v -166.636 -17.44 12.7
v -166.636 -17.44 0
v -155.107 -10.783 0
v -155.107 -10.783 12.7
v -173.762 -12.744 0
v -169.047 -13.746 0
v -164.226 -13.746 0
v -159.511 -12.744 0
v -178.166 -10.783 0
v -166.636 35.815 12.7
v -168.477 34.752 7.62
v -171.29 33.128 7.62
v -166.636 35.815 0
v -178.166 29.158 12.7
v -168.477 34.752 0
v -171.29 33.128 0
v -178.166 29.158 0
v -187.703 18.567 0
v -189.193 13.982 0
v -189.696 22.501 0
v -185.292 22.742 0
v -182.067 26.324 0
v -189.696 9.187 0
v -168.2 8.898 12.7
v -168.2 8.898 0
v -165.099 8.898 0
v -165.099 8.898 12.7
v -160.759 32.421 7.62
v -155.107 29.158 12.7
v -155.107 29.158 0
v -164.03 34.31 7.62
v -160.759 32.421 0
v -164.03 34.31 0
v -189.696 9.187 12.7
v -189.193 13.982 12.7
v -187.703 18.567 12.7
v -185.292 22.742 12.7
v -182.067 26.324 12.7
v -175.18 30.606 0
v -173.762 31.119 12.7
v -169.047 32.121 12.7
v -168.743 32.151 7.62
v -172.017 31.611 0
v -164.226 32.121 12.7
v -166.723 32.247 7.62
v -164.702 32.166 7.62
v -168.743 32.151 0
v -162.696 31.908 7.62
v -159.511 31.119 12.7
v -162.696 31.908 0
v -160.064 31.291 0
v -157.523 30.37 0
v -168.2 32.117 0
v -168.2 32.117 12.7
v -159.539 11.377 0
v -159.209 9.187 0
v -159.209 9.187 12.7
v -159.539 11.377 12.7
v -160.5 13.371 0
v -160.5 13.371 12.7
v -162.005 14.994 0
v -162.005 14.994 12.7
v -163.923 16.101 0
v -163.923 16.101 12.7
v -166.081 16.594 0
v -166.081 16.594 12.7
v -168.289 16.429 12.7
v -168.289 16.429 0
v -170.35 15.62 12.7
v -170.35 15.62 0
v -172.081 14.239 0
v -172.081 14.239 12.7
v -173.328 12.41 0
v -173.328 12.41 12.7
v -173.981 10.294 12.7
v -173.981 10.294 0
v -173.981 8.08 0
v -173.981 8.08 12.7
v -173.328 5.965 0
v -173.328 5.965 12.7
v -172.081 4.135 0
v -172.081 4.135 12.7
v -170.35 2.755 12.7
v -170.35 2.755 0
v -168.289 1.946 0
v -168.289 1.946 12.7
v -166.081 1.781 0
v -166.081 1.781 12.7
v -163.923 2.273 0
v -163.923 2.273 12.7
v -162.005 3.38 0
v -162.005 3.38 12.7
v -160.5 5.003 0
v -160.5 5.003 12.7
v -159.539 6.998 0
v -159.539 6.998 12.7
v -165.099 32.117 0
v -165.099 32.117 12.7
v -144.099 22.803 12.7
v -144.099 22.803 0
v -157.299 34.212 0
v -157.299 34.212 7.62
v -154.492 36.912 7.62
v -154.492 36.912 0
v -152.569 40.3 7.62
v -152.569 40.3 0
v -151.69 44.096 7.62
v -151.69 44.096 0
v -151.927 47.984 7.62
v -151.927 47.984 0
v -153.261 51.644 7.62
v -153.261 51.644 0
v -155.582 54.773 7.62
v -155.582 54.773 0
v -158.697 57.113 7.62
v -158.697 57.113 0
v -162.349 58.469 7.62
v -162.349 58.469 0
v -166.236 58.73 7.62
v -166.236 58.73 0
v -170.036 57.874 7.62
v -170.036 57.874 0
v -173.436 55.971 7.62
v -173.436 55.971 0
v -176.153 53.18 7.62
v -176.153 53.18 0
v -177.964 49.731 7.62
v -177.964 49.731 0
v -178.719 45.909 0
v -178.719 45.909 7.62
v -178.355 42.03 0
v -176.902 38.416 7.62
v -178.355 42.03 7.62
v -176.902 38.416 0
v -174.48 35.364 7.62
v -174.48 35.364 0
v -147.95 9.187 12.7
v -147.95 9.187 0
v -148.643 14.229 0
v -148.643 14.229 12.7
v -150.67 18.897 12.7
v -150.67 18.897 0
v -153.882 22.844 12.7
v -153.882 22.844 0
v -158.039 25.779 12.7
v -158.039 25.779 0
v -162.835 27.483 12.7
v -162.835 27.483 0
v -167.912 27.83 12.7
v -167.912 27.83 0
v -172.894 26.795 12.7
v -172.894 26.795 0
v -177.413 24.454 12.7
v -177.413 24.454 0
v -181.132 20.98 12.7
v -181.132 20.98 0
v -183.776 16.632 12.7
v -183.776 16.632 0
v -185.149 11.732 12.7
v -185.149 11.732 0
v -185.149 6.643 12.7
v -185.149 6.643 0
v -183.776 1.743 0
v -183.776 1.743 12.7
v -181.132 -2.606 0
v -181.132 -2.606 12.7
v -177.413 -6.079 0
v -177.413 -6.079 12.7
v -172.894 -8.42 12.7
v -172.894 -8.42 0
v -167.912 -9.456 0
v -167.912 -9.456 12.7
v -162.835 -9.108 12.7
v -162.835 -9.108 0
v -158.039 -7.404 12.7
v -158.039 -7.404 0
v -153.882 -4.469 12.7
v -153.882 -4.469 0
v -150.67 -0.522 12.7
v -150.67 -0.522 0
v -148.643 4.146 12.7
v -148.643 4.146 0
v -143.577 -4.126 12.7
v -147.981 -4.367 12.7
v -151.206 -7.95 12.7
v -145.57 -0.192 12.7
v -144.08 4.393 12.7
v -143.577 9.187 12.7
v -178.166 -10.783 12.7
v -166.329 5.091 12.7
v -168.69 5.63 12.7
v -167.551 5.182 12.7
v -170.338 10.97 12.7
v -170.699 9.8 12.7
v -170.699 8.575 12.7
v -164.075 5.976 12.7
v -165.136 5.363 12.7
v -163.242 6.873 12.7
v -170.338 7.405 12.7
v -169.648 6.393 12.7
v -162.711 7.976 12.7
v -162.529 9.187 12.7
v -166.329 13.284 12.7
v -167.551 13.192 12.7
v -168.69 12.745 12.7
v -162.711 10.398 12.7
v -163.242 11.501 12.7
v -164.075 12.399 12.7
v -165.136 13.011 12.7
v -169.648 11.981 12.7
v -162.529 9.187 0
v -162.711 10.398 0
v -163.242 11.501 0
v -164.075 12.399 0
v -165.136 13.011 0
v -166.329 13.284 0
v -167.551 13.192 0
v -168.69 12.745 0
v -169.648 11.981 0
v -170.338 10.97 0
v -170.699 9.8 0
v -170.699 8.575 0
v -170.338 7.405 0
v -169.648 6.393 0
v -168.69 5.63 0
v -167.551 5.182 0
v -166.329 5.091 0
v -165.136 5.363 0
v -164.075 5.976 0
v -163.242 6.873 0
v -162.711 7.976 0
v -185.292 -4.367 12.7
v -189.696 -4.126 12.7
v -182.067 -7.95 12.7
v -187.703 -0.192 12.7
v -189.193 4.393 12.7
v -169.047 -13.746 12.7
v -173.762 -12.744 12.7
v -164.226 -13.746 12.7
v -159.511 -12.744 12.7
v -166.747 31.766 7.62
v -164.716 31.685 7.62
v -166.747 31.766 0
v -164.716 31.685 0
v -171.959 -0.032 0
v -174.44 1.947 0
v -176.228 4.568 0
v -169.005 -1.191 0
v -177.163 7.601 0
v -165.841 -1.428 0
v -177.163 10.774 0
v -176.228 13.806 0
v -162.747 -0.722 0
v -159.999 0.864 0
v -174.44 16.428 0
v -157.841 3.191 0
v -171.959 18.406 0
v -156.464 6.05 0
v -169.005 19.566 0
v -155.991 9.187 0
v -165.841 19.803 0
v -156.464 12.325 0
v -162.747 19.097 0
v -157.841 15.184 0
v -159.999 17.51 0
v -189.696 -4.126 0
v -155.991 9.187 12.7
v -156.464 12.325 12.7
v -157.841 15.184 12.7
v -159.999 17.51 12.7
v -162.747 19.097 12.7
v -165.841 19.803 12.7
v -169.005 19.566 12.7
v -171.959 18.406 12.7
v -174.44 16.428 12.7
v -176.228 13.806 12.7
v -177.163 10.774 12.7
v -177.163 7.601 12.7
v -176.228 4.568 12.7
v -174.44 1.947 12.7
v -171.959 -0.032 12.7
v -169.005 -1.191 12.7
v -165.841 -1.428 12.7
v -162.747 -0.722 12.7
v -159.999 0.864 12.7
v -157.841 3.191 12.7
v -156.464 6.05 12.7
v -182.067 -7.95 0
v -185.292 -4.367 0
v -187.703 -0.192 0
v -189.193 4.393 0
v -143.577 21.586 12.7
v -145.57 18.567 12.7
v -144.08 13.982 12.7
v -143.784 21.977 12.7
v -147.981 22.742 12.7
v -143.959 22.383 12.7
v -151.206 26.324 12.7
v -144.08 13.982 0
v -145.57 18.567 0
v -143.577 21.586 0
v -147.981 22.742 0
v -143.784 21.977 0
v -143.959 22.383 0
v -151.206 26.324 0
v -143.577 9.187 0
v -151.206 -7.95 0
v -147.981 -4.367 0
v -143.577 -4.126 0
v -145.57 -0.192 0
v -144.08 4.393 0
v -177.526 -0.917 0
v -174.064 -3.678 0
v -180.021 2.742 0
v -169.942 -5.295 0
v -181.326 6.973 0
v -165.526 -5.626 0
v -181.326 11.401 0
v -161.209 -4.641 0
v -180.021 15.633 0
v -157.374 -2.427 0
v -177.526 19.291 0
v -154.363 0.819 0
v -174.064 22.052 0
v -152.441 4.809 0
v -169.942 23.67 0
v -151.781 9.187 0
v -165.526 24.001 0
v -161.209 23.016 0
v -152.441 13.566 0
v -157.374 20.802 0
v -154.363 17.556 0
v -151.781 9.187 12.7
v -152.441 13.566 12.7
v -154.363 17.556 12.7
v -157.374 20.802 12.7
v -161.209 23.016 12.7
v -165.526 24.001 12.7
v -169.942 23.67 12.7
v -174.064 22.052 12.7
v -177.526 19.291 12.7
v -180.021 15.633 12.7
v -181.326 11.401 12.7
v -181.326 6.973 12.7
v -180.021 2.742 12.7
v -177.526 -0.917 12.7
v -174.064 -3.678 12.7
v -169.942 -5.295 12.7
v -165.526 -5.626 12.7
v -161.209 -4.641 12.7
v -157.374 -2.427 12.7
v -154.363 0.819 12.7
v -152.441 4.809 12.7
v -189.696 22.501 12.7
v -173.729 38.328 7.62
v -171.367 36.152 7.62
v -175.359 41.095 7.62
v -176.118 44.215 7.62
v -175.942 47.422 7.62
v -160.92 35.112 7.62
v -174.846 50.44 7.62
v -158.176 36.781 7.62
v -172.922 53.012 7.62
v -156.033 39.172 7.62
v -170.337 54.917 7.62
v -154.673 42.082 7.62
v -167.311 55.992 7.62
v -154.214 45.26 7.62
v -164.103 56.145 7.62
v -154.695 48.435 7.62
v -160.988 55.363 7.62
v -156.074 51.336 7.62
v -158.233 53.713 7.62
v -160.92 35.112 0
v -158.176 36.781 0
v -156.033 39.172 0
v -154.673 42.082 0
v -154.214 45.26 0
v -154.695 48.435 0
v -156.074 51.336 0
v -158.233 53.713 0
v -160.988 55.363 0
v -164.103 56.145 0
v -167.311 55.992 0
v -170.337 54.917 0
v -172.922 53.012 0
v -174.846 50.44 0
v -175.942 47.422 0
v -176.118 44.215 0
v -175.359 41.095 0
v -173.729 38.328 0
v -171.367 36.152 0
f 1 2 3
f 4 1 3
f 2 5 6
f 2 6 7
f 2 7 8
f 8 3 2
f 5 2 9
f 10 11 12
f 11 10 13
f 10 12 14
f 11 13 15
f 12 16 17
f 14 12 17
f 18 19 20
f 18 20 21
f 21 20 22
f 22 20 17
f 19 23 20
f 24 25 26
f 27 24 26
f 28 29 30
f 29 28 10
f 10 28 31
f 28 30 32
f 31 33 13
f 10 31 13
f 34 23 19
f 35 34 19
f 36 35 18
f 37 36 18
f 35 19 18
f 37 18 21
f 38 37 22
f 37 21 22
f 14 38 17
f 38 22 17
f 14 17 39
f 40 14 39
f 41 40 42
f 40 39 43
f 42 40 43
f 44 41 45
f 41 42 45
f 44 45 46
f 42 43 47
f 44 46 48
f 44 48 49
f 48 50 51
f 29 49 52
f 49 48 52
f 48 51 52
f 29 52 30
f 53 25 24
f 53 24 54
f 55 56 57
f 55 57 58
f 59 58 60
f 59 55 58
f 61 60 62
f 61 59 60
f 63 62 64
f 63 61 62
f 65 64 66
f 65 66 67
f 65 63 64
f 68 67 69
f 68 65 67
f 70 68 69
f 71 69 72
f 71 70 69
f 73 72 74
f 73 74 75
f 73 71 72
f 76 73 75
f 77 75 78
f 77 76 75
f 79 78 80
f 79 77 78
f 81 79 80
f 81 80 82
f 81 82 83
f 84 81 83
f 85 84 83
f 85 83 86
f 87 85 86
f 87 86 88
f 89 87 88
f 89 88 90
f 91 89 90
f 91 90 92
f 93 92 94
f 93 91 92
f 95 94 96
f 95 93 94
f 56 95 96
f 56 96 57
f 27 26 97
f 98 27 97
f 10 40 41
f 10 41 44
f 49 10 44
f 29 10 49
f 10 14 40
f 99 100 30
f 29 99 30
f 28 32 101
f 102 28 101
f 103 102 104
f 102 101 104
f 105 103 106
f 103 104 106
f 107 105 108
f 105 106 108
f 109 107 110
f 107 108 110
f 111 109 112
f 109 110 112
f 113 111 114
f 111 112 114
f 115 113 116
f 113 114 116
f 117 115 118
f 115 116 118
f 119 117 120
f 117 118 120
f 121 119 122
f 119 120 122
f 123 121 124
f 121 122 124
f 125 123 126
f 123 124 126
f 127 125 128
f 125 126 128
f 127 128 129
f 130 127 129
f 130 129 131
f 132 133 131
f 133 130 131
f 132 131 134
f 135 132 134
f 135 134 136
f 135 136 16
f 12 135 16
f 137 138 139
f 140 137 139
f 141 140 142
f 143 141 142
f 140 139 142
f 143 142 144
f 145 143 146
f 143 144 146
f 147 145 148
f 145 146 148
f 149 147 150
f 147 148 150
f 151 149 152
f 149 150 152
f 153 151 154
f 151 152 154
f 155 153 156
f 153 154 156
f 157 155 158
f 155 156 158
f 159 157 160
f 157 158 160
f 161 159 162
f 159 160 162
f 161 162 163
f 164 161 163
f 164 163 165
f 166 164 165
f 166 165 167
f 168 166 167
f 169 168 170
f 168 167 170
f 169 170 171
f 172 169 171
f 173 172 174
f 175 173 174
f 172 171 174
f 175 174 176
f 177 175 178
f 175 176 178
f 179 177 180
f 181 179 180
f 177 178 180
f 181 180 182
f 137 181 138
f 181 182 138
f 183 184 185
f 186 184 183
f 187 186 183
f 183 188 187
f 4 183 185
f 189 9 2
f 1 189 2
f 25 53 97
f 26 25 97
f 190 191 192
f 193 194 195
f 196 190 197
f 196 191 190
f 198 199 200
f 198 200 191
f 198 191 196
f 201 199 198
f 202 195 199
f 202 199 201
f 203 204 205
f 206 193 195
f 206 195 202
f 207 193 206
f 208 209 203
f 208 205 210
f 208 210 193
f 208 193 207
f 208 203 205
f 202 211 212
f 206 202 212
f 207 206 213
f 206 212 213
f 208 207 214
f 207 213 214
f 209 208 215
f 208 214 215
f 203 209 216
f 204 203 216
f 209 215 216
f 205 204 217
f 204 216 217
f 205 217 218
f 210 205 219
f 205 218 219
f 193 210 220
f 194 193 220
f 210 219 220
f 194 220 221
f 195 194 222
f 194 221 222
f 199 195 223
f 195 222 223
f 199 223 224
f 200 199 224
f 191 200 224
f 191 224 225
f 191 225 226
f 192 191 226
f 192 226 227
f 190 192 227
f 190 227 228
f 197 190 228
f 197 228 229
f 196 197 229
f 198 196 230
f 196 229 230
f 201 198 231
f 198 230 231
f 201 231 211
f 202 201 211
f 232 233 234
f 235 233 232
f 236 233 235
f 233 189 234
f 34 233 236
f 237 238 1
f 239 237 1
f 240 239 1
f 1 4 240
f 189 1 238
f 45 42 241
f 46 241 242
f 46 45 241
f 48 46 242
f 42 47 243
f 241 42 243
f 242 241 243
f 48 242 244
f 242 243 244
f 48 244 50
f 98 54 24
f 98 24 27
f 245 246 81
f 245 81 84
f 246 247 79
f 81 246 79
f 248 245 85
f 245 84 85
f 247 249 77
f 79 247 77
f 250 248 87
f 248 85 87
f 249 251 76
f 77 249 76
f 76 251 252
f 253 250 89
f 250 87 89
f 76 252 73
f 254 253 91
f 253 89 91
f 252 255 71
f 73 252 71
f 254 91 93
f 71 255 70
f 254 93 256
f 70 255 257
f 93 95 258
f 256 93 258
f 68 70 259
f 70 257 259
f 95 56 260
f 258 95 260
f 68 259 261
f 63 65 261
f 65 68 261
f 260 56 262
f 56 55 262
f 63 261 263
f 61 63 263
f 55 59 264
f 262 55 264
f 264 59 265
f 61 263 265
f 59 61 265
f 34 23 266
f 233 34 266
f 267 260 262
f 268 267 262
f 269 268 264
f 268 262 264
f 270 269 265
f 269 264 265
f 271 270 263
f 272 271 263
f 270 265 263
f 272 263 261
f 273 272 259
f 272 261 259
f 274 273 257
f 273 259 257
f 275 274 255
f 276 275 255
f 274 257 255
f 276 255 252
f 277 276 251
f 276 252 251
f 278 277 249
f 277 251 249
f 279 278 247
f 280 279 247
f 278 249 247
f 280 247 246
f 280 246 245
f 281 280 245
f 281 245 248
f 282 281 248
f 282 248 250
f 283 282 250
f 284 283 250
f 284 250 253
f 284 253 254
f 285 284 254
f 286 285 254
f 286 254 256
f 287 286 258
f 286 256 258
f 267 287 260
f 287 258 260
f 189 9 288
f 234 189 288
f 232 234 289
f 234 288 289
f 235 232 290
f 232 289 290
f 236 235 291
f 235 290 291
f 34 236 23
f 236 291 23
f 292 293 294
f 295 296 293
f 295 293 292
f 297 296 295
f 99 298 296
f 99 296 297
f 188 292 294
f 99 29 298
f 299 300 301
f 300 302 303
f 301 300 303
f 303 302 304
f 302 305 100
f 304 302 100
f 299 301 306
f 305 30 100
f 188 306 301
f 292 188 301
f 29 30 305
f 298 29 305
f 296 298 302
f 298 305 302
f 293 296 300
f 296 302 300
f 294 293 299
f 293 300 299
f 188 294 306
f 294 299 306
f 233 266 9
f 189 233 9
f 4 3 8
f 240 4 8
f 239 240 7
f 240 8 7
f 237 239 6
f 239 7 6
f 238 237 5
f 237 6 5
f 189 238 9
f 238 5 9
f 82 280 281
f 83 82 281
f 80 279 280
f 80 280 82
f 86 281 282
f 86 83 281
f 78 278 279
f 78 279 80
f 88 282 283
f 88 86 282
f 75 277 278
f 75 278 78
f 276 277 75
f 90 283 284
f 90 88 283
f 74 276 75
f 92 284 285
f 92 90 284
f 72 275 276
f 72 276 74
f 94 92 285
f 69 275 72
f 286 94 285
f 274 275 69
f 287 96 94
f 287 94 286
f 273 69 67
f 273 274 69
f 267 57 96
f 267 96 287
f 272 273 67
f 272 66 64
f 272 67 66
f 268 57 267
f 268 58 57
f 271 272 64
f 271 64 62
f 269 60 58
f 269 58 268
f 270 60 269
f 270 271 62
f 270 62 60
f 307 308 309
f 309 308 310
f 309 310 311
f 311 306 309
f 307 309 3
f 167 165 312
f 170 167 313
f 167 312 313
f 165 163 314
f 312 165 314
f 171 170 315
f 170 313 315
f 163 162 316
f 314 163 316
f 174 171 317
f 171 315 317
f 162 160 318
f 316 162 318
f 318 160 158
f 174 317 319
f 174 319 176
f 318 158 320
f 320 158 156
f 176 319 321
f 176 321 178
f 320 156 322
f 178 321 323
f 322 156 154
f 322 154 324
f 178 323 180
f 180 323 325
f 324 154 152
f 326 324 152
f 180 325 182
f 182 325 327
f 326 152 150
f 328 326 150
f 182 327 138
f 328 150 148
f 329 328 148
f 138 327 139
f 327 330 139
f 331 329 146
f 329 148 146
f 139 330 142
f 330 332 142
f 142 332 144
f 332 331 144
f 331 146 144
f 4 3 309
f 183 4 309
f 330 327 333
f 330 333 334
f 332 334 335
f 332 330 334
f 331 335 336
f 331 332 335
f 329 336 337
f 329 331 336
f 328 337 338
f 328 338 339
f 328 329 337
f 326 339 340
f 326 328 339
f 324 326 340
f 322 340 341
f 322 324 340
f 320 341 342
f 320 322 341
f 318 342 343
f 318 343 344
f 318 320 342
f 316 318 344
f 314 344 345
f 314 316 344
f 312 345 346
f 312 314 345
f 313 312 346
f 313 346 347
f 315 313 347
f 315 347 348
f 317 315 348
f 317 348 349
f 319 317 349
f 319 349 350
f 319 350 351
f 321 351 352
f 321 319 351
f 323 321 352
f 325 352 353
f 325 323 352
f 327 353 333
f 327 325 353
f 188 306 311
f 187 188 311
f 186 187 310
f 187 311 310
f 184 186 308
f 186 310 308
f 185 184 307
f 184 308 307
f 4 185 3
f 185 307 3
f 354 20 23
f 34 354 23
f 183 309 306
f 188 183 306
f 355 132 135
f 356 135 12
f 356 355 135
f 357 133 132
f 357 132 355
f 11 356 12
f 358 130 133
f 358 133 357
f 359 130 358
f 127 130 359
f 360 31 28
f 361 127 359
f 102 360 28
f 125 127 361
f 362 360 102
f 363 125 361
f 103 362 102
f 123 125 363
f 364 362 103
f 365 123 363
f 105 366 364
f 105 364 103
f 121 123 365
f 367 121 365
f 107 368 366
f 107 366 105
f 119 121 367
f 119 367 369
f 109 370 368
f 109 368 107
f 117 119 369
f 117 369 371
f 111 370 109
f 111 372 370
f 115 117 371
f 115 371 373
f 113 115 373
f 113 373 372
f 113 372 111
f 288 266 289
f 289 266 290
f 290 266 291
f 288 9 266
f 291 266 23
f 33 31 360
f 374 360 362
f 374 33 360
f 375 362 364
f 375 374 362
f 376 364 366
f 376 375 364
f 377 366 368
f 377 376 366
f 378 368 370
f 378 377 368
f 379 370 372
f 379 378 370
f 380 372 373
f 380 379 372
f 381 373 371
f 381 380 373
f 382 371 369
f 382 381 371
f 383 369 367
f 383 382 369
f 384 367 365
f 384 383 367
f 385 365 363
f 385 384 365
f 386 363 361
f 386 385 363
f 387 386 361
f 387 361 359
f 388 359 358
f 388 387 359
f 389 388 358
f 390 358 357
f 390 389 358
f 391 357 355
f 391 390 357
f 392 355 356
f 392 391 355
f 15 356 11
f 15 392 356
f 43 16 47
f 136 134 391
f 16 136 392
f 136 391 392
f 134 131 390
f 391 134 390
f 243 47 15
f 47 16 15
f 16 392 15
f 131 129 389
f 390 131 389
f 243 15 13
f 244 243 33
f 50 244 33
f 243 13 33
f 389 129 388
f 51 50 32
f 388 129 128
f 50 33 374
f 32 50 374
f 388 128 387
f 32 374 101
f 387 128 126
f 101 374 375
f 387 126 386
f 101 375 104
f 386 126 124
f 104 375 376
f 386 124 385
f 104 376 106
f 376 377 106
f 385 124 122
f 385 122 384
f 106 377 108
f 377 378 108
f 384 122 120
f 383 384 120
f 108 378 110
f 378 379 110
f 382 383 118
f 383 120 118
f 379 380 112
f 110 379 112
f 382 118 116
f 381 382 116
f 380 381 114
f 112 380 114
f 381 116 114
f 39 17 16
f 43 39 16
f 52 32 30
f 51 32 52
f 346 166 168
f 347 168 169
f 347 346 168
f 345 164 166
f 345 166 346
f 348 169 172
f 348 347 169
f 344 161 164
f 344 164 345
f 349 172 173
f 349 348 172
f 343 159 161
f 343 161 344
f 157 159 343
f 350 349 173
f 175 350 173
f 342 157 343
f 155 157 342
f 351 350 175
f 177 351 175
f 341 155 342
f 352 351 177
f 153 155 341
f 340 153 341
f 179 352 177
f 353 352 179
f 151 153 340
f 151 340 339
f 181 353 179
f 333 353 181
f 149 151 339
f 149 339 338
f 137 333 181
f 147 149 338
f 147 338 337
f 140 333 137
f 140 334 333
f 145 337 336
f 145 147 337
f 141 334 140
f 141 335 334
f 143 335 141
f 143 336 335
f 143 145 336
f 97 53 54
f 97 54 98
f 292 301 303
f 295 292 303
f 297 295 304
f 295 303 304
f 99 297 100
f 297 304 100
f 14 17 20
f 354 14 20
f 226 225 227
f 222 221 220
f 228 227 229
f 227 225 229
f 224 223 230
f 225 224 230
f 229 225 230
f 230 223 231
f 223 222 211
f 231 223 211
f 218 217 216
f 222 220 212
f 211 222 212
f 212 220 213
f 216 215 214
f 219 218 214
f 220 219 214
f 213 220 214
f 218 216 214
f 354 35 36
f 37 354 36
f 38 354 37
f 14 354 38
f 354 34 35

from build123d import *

# Parameters (mm, degrees)
F1_DEPTH = 12.7
F0_R     = 18.6864739048
F0_R_2   = 14.8551500705
F0_R_3   = 10.6453512424
F0_R_4   = 7.4275754644
F0_R_5   = 4.107916277
F2_R     = 13.5468466728
F2_R_2   = 10.9752635495
F3_DEPTH = 7.62
F4_W     = 3.1017959118
F4_H     = 23.2182014734
F5_DEPTH = 12.7


with BuildPart() as f1:
    # F0 (on Top) → F1 (new body)
    with BuildSketch(Plane.XY):
        with BuildLine():
            ThreePointArc((-178.1664486666, 29.1577973537), (-166.6364817093, 32.2472425178), (-155.1065147981, 29.1577971819))
            Line((-155.1065147981, 29.1577971819), (-166.6364818811, 35.814626781))
            Line((-166.6364818811, 35.814626781), (-178.1664486666, 29.1577973537))
        make_face()
    extrude(amount=F1_DEPTH)

    # F2 (on Top) → F3 (join)
    with BuildSketch(Plane.XY):
        with Locations((-165.1894748211, 45.2233031392)):
            Circle(F2_R)
        with Locations((-165.1894748211, 45.2233031392)):
            Circle(F2_R_2, mode=Mode.SUBTRACT)
    extrude(amount=F3_DEPTH)


with BuildPart() as f1b:
    # F0 (on Top) → F1, piece 2 (new body)
    with BuildSketch(Plane.XY):
        with BuildLine():
            ThreePointArc((-189.6964162588, 9.1873081401), (-186.6069707454, 20.7172755306), (-178.1664486666, 29.1577973537))
            Line((-178.1664486666, 29.1577973537), (-189.6964162588, 22.5009674605))
            Line((-189.6964162588, 22.5009674605), (-189.6964162588, 9.1873081401))
        make_face()
    extrude(amount=F1_DEPTH)


with BuildPart() as f1c:
    # F0 (on Top) → F1, piece 3 (new body)
    with BuildSketch(Plane.XY):
        with BuildLine():
            Line((-189.6964162588, -4.1263511803), (-178.1664492719, -10.783180724))
            ThreePointArc((-178.1664492719, -10.783180724), (-186.6069709201, -2.3426589477), (-189.6964162588, 9.1873081401))
            Line((-189.6964162588, 9.1873081401), (-189.6964162588, -4.1263511803))
        make_face()
    extrude(amount=F1_DEPTH)


with BuildPart() as f1d:
    # F0 (on Top) → F1, piece 4 (new body)
    with BuildSketch(Plane.XY):
        with BuildLine():
            Line((-166.6364818811, -17.4400105008), (-155.1065149821, -10.7831810079))
            ThreePointArc((-155.1065149821, -10.7831810079), (-166.636482165, -13.8726262376), (-178.1664492719, -10.783180724))
            Line((-178.1664492719, -10.783180724), (-166.6364818811, -17.4400105008))
        make_face()
    extrude(amount=F1_DEPTH)


with BuildPart() as f1e:
    # F0 (on Top) → F1, piece 5 (new body)
    with BuildSketch(Plane.XY):
        with BuildLine():
            Line((-143.5765475035, -4.1263511803), (-143.5765475035, 9.1873081401))
            ThreePointArc((-143.5765475035, 9.1873081401), (-146.6659929841, -2.3426591936), (-155.1065149821, -10.7831810079))
            Line((-155.1065149821, -10.7831810079), (-143.5765475035, -4.1263511803))
        make_face()
    extrude(amount=F1_DEPTH)


with BuildPart() as f1f:
    # F0 (on Top) → F1, piece 6 (new body)
    with BuildSketch(Plane.XY):
        with BuildLine():
            Line((-143.5765475035, 9.1873081401), (-143.5765475035, 21.5858570699))
            ThreePointArc((-143.5765475035, 21.5858570699), (-143.8753066183, 22.1783429053), (-144.0994738784, 22.8028791439))
            Line((-144.0994738784, 22.8028791439), (-155.1065147981, 29.1577971819))
            ThreePointArc((-155.1065147981, 29.1577971819), (-146.665992931, 20.7172753819), (-143.5765475035, 9.1873081401))
        make_face()
    extrude(amount=F1_DEPTH)


with BuildPart() as f1g:
    # F0 (on Top) → F1, piece 7 (new body)
    with BuildSketch(Plane.XY):
        with Locations((-166.6364818811, 9.1873081401)):
            Circle(F0_R)
        with Locations((-166.6364818811, 9.1873081401)):
            Circle(F0_R_2, mode=Mode.SUBTRACT)
    extrude(amount=F1_DEPTH)


with BuildPart() as f1h:
    # F0 (on Top) → F1, piece 8 (new body)
    with BuildSketch(Plane.XY):
        with Locations((-166.6364818811, 9.1873081401)):
            Circle(F0_R_3)
        with Locations((-166.6364818811, 9.1873081401)):
            Circle(F0_R_4, mode=Mode.SUBTRACT)
    extrude(amount=F1_DEPTH)


with BuildPart() as f1i:
    # F0 (on Top) → F1, piece 9 (new body)
    with BuildSketch(Plane.XY):
        with Locations((-166.6364818811, 9.1873081401)):
            Circle(F0_R_5)
    extrude(amount=F1_DEPTH)


with BuildPart() as f5:
    # F4 (on Top) → F5 (new body)
    with BuildSketch(Plane.XY):
        with Locations((-166.6494160891, 20.5074278638)):
            Rectangle(F4_W, F4_H)
    extrude(amount=F5_DEPTH)


solid = Compound([f1.part, f1b.part, f1c.part, f1d.part, f1e.part, f1f.part, f1g.part, f1h.part, f1i.part, f5.part])
